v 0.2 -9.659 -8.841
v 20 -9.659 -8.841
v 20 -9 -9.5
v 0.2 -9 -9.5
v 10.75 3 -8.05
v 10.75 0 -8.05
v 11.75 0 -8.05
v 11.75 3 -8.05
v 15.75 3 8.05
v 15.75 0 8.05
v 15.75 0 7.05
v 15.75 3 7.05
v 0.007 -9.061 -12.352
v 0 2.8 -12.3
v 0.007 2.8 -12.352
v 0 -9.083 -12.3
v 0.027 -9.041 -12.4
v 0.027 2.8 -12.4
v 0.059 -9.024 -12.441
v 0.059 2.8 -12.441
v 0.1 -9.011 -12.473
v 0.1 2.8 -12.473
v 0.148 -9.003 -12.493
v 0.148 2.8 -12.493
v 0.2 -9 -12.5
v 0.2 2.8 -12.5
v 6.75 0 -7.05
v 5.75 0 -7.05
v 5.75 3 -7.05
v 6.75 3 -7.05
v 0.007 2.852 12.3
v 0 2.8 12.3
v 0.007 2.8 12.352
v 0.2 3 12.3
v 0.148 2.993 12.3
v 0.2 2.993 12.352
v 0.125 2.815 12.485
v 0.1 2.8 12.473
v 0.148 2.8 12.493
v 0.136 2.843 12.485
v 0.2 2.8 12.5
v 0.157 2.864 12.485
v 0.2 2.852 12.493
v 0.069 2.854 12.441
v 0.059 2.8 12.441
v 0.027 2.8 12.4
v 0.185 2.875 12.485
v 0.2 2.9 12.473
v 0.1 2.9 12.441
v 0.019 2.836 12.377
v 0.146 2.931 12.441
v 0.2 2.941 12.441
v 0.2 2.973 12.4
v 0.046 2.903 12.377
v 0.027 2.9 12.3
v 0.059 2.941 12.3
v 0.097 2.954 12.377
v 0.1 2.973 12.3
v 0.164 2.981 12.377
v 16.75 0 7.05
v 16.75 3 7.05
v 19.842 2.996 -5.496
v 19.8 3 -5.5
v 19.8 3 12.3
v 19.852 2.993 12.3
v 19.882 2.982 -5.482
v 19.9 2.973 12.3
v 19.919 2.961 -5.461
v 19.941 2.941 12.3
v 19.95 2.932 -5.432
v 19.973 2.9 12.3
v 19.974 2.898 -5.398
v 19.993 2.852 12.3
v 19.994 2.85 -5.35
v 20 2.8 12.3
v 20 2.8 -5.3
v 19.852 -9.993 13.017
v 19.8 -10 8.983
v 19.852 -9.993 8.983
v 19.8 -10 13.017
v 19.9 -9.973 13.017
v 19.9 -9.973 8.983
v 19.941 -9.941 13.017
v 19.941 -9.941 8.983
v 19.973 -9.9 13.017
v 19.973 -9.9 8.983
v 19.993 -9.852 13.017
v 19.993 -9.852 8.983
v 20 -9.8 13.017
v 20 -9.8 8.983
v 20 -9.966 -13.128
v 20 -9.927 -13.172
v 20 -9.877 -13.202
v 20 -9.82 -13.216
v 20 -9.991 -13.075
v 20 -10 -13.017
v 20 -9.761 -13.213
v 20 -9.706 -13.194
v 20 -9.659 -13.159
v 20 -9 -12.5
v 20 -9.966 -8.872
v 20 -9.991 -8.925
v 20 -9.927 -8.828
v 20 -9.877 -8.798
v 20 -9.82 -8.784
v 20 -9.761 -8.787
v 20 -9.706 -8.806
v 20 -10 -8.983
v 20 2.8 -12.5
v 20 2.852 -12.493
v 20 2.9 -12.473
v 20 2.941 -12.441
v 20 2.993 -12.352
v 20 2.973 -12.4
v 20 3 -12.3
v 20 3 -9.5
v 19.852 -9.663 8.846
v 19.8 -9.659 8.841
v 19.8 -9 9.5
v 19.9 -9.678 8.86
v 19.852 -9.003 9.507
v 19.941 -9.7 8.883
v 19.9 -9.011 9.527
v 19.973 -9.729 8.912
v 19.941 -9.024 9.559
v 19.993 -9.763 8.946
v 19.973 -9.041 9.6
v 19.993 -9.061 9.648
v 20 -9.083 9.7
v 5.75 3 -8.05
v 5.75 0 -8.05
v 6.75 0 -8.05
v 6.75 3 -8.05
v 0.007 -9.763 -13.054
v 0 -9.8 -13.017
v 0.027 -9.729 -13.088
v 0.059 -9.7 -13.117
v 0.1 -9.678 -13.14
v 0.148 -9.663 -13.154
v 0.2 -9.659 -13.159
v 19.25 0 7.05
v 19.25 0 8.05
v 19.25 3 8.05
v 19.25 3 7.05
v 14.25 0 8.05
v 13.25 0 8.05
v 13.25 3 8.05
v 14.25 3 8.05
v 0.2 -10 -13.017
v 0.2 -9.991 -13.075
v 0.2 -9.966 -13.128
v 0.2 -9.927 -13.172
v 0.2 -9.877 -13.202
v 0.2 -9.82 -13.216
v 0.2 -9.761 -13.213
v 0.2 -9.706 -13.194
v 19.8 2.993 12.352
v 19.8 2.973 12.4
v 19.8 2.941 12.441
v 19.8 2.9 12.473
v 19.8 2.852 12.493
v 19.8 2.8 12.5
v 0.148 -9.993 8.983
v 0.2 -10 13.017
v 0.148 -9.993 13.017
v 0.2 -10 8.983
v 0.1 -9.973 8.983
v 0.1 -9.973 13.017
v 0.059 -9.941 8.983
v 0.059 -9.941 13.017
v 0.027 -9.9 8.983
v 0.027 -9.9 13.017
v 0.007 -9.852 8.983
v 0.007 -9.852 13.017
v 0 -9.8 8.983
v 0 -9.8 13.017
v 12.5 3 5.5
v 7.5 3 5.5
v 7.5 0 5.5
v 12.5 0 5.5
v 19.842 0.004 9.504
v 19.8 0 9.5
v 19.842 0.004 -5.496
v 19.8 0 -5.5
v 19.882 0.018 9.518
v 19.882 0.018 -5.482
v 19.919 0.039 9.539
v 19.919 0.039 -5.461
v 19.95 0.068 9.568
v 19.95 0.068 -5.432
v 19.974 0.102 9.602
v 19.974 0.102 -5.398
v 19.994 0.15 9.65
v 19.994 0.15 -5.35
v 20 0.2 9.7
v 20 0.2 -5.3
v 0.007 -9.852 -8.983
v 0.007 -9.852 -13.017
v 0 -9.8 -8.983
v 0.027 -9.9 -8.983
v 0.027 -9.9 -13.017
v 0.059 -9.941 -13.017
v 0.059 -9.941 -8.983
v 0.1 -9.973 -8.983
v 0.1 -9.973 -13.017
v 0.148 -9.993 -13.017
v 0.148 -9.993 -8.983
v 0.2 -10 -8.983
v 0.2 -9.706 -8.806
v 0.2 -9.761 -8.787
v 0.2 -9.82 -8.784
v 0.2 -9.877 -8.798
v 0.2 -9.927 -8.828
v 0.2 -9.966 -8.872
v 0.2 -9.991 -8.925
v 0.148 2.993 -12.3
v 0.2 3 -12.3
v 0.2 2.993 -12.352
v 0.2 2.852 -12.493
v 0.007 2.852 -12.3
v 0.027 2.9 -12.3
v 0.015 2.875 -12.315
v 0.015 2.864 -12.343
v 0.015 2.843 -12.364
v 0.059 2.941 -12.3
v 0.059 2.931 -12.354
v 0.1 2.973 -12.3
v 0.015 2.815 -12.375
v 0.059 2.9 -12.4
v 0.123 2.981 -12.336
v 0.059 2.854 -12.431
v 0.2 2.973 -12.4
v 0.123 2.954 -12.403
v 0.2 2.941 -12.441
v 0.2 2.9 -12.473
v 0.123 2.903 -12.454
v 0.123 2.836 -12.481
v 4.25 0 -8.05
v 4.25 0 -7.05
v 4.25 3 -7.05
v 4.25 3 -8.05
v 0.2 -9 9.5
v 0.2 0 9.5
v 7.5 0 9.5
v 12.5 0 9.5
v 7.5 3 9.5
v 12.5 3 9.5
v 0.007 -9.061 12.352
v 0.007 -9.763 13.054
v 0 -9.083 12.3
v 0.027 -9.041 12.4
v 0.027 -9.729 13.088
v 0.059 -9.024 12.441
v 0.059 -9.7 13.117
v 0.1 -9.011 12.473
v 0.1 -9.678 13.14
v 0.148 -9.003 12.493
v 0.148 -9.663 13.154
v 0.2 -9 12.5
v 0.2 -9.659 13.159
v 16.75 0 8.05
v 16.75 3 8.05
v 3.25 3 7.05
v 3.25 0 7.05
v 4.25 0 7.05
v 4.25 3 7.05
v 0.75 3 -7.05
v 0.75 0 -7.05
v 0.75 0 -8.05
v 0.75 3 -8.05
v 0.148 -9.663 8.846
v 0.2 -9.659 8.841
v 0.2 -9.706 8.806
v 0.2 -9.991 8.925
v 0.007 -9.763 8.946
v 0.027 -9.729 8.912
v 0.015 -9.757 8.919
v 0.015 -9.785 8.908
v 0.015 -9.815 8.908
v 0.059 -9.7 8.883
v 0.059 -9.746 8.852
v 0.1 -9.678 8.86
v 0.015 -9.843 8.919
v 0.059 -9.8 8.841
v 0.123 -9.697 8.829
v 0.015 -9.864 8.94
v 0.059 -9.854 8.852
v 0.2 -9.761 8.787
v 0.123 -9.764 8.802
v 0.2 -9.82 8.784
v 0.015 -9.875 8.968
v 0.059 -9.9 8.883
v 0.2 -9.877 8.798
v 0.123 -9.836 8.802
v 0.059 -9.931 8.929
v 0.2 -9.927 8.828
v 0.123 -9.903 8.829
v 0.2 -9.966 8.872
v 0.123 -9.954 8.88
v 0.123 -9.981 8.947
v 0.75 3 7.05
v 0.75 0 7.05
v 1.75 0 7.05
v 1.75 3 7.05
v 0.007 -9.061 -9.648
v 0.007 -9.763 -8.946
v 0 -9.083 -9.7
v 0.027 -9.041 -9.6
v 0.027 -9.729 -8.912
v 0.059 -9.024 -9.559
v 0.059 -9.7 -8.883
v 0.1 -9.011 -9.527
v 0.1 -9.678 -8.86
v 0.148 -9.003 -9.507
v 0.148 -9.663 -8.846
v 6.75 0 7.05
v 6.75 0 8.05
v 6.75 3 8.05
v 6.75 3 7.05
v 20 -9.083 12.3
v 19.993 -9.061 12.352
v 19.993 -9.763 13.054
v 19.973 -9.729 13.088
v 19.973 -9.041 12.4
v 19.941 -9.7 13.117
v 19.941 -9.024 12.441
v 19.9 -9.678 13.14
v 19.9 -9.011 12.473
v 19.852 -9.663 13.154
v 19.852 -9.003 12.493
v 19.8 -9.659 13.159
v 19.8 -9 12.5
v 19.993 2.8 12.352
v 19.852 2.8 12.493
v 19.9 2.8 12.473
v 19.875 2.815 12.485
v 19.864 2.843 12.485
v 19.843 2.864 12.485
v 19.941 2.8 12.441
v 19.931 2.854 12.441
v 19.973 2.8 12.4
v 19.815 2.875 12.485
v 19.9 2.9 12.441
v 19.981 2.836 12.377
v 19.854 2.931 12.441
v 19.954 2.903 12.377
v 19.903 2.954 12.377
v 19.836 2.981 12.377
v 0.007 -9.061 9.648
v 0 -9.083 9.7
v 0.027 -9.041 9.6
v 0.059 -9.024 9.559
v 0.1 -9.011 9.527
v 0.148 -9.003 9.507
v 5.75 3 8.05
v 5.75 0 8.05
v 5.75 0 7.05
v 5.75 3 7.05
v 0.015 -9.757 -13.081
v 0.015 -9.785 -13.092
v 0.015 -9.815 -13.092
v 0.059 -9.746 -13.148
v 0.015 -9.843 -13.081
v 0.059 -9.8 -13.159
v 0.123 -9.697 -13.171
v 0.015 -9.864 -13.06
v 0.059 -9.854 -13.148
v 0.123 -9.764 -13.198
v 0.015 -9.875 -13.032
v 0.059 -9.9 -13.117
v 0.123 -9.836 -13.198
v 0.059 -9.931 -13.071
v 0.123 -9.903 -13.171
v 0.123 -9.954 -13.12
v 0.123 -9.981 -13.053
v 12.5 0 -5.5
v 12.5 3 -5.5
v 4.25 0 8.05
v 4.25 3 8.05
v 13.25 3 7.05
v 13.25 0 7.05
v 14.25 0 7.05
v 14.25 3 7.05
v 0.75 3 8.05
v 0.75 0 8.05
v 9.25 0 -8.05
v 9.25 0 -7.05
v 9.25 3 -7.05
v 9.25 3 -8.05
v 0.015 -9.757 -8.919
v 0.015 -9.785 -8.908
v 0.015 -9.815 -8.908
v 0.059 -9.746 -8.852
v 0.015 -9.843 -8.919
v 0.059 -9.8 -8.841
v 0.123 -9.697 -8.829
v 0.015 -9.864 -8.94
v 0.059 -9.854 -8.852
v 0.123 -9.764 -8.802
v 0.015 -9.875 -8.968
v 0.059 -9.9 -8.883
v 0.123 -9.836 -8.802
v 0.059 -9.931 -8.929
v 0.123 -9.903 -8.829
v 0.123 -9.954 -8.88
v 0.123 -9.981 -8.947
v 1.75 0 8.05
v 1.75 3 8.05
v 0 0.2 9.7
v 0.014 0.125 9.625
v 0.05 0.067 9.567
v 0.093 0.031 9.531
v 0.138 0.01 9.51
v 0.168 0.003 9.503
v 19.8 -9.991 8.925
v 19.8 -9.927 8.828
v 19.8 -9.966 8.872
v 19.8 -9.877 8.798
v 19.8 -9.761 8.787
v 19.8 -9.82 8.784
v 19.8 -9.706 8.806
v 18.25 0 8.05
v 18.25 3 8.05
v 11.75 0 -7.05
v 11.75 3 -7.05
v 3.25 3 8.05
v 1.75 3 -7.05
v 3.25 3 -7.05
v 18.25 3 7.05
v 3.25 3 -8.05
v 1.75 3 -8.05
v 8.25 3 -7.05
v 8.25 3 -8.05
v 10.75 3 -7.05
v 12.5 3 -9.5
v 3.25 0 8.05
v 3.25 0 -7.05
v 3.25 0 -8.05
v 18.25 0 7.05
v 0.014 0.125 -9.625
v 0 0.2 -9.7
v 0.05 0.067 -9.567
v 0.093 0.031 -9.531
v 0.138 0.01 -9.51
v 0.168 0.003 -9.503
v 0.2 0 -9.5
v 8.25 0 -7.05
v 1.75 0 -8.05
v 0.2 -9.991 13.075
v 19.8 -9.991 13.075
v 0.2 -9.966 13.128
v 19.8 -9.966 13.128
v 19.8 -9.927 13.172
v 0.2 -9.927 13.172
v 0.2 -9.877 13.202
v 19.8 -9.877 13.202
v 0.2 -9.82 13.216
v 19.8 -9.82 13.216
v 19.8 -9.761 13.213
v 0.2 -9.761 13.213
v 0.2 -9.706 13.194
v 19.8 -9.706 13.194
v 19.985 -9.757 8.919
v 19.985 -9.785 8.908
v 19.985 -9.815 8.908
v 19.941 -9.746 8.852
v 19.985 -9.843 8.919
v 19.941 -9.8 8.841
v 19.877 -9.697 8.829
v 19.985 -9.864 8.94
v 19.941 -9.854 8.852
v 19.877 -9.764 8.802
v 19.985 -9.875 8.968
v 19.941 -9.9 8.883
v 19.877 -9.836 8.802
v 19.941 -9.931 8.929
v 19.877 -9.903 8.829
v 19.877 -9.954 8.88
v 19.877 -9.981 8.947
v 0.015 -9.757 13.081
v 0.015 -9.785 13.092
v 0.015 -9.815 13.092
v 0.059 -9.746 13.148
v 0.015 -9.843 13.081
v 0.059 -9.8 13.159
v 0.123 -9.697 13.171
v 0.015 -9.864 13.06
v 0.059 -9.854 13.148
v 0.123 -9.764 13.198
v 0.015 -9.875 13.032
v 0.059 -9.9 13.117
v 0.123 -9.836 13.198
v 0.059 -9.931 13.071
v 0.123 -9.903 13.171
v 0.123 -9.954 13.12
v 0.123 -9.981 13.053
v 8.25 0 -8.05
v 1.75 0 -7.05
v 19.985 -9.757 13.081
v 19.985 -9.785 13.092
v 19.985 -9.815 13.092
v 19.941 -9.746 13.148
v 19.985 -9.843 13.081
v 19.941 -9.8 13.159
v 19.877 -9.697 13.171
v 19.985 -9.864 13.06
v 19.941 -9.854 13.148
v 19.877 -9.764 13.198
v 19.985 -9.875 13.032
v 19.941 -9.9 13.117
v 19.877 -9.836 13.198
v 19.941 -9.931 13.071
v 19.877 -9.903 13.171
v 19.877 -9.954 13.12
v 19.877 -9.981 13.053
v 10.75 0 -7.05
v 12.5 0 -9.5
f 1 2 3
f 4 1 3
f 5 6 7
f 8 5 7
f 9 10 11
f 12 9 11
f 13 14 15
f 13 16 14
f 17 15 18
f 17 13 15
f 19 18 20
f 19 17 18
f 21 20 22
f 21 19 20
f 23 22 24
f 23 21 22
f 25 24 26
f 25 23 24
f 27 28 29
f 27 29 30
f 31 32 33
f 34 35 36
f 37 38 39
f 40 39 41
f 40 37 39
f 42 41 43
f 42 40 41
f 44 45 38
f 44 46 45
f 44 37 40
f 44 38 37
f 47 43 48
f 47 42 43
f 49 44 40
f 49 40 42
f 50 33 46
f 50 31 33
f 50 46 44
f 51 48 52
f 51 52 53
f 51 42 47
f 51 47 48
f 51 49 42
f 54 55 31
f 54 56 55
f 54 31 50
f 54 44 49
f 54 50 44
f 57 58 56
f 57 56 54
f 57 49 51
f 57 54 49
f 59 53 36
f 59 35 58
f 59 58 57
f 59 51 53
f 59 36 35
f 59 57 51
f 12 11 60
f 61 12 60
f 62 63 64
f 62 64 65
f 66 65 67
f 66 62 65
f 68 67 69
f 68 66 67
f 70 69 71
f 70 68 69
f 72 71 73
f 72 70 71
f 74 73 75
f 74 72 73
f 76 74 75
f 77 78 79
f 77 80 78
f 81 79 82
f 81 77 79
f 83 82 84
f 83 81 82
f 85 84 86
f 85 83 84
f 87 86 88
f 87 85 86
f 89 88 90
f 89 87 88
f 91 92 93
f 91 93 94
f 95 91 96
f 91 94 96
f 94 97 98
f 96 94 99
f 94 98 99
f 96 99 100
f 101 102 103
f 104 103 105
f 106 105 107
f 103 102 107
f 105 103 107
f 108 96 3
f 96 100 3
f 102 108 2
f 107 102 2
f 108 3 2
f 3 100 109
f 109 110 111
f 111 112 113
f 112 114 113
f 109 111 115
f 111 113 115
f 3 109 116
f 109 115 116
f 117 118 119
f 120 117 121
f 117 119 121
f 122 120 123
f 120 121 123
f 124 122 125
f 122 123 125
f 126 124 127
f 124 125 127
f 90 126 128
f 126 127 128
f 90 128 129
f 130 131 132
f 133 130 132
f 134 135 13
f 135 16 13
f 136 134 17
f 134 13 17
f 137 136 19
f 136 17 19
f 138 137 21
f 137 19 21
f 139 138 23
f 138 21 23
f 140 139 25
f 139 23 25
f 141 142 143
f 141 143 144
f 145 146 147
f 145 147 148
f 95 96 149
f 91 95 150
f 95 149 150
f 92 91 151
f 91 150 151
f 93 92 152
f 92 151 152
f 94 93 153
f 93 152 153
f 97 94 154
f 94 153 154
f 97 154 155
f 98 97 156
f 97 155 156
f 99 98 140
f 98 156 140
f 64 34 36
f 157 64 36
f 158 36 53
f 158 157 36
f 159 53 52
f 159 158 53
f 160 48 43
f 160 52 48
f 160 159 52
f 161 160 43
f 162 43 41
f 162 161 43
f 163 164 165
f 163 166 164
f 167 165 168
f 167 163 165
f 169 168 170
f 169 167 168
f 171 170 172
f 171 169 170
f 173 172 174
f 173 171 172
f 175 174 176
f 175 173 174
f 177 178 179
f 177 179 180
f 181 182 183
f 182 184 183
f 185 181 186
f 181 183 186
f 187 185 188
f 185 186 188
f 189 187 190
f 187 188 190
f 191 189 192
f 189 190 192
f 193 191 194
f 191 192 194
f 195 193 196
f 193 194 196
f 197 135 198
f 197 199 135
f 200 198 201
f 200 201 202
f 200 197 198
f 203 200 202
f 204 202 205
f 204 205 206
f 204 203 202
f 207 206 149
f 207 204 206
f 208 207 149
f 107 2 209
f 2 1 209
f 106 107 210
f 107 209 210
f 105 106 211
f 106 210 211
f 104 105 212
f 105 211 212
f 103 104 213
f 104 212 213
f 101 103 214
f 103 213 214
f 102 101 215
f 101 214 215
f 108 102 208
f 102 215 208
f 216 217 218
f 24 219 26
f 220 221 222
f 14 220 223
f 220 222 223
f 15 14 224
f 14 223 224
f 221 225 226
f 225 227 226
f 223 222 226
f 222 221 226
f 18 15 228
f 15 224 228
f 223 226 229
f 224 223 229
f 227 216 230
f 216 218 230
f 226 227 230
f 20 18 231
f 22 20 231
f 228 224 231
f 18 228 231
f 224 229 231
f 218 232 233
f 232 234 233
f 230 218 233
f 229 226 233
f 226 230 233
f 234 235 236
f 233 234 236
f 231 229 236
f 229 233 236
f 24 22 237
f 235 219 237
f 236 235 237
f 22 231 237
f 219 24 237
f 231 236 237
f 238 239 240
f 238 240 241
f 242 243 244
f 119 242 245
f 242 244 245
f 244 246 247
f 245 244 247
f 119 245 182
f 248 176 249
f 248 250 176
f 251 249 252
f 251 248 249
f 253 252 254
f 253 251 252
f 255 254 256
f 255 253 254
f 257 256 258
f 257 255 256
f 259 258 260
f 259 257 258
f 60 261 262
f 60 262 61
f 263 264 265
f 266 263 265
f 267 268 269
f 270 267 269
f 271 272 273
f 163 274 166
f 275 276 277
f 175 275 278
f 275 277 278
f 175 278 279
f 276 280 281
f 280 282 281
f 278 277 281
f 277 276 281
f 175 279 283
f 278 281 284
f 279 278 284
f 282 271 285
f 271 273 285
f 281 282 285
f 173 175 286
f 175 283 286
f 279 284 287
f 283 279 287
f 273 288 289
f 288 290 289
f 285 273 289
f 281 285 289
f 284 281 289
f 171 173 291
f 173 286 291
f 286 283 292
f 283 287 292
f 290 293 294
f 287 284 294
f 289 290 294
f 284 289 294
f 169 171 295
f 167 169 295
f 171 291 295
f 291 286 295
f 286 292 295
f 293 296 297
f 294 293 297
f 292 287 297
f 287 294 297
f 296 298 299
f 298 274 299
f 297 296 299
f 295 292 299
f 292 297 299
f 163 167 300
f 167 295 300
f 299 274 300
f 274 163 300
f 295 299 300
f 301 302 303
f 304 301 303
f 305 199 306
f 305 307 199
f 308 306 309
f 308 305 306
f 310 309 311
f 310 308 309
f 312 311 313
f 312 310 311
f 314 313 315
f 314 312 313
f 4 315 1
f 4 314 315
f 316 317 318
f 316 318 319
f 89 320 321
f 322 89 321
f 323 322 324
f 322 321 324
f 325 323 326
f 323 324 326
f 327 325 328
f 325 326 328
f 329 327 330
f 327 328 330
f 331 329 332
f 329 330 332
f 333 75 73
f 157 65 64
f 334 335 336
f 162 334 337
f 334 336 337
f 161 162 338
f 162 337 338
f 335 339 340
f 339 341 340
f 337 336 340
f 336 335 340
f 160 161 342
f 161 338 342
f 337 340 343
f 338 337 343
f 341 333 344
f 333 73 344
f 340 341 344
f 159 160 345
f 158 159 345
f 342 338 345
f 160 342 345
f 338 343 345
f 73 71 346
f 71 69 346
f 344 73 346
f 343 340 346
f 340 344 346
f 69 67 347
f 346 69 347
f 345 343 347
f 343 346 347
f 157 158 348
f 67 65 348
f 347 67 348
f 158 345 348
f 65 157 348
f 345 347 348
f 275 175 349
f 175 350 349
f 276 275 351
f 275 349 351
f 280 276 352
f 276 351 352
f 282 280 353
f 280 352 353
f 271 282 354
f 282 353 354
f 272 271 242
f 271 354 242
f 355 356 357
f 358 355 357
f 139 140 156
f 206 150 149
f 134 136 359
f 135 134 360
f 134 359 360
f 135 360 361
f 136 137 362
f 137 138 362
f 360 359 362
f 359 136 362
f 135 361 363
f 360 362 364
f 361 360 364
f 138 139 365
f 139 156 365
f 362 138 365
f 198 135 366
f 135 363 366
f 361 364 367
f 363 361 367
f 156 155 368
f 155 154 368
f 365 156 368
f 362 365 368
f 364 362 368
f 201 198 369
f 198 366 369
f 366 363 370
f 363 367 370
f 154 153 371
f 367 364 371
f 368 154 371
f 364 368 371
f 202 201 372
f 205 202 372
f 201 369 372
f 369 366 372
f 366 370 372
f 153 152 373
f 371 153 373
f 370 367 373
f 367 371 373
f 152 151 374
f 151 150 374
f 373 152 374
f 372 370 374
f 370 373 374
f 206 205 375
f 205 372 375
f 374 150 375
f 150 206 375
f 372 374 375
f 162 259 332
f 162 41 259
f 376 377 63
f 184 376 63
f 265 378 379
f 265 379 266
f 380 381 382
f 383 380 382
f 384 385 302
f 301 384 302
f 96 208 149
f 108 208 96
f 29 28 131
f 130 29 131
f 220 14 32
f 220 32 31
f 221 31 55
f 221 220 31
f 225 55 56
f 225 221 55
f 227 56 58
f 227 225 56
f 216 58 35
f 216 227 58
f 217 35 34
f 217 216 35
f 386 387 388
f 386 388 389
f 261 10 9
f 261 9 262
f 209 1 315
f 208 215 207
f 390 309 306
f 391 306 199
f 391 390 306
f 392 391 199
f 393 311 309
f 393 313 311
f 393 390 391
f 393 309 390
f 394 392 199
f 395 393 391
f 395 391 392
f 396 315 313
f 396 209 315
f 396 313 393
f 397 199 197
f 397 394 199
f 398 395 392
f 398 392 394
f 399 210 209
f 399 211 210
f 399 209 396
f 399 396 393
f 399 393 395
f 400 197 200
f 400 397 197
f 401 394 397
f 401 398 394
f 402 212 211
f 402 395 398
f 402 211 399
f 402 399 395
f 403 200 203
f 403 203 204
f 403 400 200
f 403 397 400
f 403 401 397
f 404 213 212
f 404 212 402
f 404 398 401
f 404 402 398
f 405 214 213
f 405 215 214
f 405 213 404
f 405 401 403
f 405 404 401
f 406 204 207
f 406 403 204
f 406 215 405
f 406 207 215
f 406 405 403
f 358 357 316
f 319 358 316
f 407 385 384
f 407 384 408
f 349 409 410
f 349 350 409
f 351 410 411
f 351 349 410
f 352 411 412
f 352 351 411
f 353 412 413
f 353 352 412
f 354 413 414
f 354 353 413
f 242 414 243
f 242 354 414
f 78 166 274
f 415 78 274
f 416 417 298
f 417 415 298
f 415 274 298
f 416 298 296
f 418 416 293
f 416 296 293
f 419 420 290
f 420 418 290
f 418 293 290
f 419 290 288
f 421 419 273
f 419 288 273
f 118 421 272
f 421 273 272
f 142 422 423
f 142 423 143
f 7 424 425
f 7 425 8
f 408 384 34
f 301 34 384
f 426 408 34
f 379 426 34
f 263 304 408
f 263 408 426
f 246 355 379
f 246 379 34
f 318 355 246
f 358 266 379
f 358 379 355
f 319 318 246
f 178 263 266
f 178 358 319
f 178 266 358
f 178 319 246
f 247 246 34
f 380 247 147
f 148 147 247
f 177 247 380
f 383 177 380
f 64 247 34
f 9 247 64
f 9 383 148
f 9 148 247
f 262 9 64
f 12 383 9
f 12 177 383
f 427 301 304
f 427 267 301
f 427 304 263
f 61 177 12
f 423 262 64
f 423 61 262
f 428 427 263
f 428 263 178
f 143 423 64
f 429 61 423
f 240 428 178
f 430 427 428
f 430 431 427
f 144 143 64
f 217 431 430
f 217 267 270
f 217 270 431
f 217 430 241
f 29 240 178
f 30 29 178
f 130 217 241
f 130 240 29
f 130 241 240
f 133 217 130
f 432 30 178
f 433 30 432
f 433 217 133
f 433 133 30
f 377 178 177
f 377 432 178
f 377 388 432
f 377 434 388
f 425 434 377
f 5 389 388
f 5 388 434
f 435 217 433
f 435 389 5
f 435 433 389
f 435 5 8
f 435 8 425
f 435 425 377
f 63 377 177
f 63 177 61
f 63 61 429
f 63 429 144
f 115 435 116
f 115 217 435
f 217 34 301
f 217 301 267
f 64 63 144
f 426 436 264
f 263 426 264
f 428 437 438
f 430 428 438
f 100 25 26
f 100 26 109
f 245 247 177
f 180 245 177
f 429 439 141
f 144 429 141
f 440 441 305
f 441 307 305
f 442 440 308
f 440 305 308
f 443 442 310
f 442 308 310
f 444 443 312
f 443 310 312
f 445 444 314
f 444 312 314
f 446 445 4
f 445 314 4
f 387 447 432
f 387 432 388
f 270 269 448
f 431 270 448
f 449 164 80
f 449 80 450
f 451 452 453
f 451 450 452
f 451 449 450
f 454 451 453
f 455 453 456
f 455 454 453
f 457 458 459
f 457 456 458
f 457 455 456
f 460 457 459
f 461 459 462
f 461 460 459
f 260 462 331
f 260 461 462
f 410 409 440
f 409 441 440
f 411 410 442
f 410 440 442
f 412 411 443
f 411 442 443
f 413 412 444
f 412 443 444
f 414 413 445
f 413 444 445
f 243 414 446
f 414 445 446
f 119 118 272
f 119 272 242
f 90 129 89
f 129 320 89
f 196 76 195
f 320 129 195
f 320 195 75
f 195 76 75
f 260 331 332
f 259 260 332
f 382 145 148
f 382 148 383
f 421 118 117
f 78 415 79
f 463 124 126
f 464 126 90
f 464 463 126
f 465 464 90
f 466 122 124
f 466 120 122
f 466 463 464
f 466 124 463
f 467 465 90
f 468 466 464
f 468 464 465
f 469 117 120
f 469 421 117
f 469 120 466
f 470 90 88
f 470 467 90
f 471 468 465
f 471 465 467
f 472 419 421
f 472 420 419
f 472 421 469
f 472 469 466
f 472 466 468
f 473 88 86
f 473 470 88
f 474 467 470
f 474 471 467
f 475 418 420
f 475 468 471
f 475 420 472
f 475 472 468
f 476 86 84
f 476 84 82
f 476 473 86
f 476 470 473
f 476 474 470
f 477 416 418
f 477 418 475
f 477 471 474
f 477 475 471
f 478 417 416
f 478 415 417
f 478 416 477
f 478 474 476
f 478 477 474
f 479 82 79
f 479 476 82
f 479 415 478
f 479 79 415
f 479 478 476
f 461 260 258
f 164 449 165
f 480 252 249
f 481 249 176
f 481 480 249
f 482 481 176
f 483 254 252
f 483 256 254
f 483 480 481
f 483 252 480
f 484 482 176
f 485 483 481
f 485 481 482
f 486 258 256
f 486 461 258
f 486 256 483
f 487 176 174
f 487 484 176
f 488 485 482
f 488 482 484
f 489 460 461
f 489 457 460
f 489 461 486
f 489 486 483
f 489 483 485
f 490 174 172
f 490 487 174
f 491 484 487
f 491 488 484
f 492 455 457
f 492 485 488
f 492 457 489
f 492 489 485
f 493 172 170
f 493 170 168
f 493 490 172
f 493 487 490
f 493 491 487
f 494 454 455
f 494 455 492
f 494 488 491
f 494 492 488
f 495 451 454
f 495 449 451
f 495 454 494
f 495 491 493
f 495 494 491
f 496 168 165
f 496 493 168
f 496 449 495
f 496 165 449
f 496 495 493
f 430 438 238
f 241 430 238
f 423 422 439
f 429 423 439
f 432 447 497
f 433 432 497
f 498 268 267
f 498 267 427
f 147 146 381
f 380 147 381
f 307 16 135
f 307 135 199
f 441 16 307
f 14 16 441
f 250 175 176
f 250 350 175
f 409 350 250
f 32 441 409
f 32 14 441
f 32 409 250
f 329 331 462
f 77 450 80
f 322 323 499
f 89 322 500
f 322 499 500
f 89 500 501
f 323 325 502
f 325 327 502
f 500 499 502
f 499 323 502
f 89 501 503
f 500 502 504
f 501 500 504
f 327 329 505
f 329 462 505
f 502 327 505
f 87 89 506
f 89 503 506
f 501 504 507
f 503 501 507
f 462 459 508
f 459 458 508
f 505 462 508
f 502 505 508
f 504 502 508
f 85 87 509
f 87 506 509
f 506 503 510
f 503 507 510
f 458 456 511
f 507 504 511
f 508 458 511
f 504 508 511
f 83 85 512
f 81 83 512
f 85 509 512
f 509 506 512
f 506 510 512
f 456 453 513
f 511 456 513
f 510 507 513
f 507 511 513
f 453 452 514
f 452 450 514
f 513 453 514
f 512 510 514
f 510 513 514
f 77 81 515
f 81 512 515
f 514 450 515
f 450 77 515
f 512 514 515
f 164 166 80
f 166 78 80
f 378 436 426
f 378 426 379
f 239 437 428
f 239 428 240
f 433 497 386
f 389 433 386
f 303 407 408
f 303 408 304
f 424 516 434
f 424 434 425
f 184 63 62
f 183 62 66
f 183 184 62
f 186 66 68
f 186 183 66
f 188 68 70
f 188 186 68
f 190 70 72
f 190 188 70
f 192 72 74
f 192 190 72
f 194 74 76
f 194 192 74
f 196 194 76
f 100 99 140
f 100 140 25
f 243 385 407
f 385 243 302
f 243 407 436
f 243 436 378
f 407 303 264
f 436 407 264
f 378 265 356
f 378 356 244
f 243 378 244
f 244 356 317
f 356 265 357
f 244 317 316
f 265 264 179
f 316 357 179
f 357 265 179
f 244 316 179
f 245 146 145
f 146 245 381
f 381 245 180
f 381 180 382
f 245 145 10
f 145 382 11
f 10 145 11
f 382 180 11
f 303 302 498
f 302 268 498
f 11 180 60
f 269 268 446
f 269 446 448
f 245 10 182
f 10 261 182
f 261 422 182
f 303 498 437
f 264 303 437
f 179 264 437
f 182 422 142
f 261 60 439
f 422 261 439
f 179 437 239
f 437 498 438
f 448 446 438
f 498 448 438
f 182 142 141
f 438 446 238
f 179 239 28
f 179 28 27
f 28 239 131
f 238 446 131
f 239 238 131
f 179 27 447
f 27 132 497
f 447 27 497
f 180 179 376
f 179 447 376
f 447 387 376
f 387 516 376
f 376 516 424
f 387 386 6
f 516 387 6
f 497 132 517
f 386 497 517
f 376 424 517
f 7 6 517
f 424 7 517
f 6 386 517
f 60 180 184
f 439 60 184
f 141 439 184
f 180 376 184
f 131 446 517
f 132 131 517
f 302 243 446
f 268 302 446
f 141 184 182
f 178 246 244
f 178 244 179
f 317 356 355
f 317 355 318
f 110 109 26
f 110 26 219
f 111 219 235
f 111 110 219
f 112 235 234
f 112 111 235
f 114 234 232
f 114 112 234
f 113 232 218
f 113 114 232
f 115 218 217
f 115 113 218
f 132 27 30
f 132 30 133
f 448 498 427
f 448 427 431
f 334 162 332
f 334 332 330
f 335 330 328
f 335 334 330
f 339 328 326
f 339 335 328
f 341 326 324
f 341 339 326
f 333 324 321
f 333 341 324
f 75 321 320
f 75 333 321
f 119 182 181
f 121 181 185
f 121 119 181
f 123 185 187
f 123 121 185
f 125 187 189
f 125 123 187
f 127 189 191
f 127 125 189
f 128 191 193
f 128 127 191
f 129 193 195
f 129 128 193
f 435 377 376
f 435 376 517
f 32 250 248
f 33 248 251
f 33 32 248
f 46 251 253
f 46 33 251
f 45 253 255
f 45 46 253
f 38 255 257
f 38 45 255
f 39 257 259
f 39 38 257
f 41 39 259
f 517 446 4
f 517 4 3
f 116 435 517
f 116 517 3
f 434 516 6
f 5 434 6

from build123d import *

# Parameters (mm, degrees)
SKETCH_2_W          = 20
SKETCH_2_H          = 25
SKETCH_2_W_2        = 1
SKETCH_2_H_2        = 1
EXTRUDE_1_DEPTH     = 3
SKETCH_3_W          = 20
SKETCH_3_H          = 3
EXTRUDE_2_DEPTH     = 10
SKETCH_5_W          = 7.5
SKETCH_5_H          = 4
SKETCH_5_W_2        = 5
CUT_EXTRUDE_1_DEPTH = 3
EXTRUDE_3_DEPTH     = 20
FILLET_1_R          = 0.2


with BuildPart() as part:
    # 草图2 → 凸台-拉伸1 (new body)
    with BuildSketch(Plane(origin=(0, 0, 0), x_dir=(1, 0, 0), z_dir=(0, 1, 0))):
        with Locations((10, 0)):
            Rectangle(SKETCH_2_W, SKETCH_2_H)
        with Locations((1.25, -7.55)):
            Rectangle(SKETCH_2_W_2, SKETCH_2_H_2, mode=Mode.SUBTRACT)
        with Locations((3.75, -7.55)):
            Rectangle(SKETCH_2_W_2, SKETCH_2_H_2, mode=Mode.SUBTRACT)
        with Locations((6.25, -7.55)):
            Rectangle(SKETCH_2_W_2, SKETCH_2_H_2, mode=Mode.SUBTRACT)
        with Locations((8.75, -7.55)):
            Rectangle(SKETCH_2_W_2, SKETCH_2_H_2, mode=Mode.SUBTRACT)
        with Locations((11.25, -7.55)):
            Rectangle(SKETCH_2_W_2, SKETCH_2_H_2, mode=Mode.SUBTRACT)
        with Locations((13.75, -7.55)):
            Rectangle(SKETCH_2_W_2, SKETCH_2_H_2, mode=Mode.SUBTRACT)
        with Locations((16.25, -7.55)):
            Rectangle(SKETCH_2_W_2, SKETCH_2_H_2, mode=Mode.SUBTRACT)
        with Locations((18.75, -7.55)):
            Rectangle(SKETCH_2_W_2, SKETCH_2_H_2, mode=Mode.SUBTRACT)
        with Locations((18.75, 7.55)):
            Rectangle(SKETCH_2_W_2, SKETCH_2_H_2, mode=Mode.SUBTRACT)
        with Locations((16.25, 7.55)):
            Rectangle(SKETCH_2_W_2, SKETCH_2_H_2, mode=Mode.SUBTRACT)
        with Locations((13.75, 7.55)):
            Rectangle(SKETCH_2_W_2, SKETCH_2_H_2, mode=Mode.SUBTRACT)
        with Locations((11.25, 7.55)):
            Rectangle(SKETCH_2_W_2, SKETCH_2_H_2, mode=Mode.SUBTRACT)
        with Locations((8.75, 7.55)):
            Rectangle(SKETCH_2_W_2, SKETCH_2_H_2, mode=Mode.SUBTRACT)
        with Locations((6.25, 7.55)):
            Rectangle(SKETCH_2_W_2, SKETCH_2_H_2, mode=Mode.SUBTRACT)
        with Locations((3.75, 7.55)):
            Rectangle(SKETCH_2_W_2, SKETCH_2_H_2, mode=Mode.SUBTRACT)
        with Locations((1.25, 7.55)):
            Rectangle(SKETCH_2_W_2, SKETCH_2_H_2, mode=Mode.SUBTRACT)
    extrude(amount=EXTRUDE_1_DEPTH)

    # 草图3 → 凸台-拉伸2 (add)
    with BuildSketch(Plane.XZ):
        with Locations((10, 11)):
            Rectangle(SKETCH_3_W, SKETCH_3_H)
        with Locations((10, -11)):
            Rectangle(SKETCH_3_W, SKETCH_3_H)
    extrude(amount=EXTRUDE_2_DEPTH)

    # 草图5 → 切除-拉伸1 (cut)
    with BuildSketch(Plane(origin=(0, 3, 0), x_dir=(1, 0, 0), z_dir=(0, 1, 0))):
        with Locations((16.25, 7.5)):
            Rectangle(SKETCH_5_W, SKETCH_5_H)
        with Locations((10, -7.5)):
            Rectangle(SKETCH_5_W_2, SKETCH_5_H)
    extrude(amount=-CUT_EXTRUDE_1_DEPTH, mode=Mode.SUBTRACT)

    # 草图4 → 凸台-拉伸3 (add)
    with BuildSketch(Plane(origin=(20, 0, 0), x_dir=(0, 0, -1), z_dir=(1, 0, 0))):
        Polygon((-12.5, -10), (-13.5, -10), (-12.5, -9), align=None)
        Polygon((9.5, -10), (8.5, -10), (9.5, -9), align=None)
        Polygon((12.5, -10), (13.5, -10), (12.5, -9), align=None)
        Polygon((-9.5, -10), (-8.5, -10), (-9.5, -9), align=None)
    extrude(amount=-EXTRUDE_3_DEPTH)

    # 圆角1
    fillet_1_edges = [part.edges().sort_by_distance(p)[0] for p in [
        (20, 3, 3.5),
        (10, 3, -12.5),
        (20, 0, 2),
        (0, -10, 11),
        (20, -10, 11),
        (0, 0, 0),
        (0, -10, -11),
        (20, 1.5, -5.5),
        (10, -10, 13.5),
        (20, -9.5, 13),
        (0, -9.5, 13),
        (0, -4.5, -9.5),
        (10, -10, -8.5),
        (0, -9.5, -9),
        (10, -10, -13.5),
        (0, -9.5, -13),
        (20, -4.5, 9.5),
        (0, -4.5, 9.5),
        (10, -10, 8.5),
        (20, -9.5, 9),
        (0, -9.5, 9),
        (0, 3, 0),
        (0, -3, -12.5),
        (20, -3, 12.5),
        (0, -3, 12.5),
        (10, 3, 12.5),
    ]]
    fillet(fillet_1_edges, radius=FILLET_1_R)


solid = part.part
